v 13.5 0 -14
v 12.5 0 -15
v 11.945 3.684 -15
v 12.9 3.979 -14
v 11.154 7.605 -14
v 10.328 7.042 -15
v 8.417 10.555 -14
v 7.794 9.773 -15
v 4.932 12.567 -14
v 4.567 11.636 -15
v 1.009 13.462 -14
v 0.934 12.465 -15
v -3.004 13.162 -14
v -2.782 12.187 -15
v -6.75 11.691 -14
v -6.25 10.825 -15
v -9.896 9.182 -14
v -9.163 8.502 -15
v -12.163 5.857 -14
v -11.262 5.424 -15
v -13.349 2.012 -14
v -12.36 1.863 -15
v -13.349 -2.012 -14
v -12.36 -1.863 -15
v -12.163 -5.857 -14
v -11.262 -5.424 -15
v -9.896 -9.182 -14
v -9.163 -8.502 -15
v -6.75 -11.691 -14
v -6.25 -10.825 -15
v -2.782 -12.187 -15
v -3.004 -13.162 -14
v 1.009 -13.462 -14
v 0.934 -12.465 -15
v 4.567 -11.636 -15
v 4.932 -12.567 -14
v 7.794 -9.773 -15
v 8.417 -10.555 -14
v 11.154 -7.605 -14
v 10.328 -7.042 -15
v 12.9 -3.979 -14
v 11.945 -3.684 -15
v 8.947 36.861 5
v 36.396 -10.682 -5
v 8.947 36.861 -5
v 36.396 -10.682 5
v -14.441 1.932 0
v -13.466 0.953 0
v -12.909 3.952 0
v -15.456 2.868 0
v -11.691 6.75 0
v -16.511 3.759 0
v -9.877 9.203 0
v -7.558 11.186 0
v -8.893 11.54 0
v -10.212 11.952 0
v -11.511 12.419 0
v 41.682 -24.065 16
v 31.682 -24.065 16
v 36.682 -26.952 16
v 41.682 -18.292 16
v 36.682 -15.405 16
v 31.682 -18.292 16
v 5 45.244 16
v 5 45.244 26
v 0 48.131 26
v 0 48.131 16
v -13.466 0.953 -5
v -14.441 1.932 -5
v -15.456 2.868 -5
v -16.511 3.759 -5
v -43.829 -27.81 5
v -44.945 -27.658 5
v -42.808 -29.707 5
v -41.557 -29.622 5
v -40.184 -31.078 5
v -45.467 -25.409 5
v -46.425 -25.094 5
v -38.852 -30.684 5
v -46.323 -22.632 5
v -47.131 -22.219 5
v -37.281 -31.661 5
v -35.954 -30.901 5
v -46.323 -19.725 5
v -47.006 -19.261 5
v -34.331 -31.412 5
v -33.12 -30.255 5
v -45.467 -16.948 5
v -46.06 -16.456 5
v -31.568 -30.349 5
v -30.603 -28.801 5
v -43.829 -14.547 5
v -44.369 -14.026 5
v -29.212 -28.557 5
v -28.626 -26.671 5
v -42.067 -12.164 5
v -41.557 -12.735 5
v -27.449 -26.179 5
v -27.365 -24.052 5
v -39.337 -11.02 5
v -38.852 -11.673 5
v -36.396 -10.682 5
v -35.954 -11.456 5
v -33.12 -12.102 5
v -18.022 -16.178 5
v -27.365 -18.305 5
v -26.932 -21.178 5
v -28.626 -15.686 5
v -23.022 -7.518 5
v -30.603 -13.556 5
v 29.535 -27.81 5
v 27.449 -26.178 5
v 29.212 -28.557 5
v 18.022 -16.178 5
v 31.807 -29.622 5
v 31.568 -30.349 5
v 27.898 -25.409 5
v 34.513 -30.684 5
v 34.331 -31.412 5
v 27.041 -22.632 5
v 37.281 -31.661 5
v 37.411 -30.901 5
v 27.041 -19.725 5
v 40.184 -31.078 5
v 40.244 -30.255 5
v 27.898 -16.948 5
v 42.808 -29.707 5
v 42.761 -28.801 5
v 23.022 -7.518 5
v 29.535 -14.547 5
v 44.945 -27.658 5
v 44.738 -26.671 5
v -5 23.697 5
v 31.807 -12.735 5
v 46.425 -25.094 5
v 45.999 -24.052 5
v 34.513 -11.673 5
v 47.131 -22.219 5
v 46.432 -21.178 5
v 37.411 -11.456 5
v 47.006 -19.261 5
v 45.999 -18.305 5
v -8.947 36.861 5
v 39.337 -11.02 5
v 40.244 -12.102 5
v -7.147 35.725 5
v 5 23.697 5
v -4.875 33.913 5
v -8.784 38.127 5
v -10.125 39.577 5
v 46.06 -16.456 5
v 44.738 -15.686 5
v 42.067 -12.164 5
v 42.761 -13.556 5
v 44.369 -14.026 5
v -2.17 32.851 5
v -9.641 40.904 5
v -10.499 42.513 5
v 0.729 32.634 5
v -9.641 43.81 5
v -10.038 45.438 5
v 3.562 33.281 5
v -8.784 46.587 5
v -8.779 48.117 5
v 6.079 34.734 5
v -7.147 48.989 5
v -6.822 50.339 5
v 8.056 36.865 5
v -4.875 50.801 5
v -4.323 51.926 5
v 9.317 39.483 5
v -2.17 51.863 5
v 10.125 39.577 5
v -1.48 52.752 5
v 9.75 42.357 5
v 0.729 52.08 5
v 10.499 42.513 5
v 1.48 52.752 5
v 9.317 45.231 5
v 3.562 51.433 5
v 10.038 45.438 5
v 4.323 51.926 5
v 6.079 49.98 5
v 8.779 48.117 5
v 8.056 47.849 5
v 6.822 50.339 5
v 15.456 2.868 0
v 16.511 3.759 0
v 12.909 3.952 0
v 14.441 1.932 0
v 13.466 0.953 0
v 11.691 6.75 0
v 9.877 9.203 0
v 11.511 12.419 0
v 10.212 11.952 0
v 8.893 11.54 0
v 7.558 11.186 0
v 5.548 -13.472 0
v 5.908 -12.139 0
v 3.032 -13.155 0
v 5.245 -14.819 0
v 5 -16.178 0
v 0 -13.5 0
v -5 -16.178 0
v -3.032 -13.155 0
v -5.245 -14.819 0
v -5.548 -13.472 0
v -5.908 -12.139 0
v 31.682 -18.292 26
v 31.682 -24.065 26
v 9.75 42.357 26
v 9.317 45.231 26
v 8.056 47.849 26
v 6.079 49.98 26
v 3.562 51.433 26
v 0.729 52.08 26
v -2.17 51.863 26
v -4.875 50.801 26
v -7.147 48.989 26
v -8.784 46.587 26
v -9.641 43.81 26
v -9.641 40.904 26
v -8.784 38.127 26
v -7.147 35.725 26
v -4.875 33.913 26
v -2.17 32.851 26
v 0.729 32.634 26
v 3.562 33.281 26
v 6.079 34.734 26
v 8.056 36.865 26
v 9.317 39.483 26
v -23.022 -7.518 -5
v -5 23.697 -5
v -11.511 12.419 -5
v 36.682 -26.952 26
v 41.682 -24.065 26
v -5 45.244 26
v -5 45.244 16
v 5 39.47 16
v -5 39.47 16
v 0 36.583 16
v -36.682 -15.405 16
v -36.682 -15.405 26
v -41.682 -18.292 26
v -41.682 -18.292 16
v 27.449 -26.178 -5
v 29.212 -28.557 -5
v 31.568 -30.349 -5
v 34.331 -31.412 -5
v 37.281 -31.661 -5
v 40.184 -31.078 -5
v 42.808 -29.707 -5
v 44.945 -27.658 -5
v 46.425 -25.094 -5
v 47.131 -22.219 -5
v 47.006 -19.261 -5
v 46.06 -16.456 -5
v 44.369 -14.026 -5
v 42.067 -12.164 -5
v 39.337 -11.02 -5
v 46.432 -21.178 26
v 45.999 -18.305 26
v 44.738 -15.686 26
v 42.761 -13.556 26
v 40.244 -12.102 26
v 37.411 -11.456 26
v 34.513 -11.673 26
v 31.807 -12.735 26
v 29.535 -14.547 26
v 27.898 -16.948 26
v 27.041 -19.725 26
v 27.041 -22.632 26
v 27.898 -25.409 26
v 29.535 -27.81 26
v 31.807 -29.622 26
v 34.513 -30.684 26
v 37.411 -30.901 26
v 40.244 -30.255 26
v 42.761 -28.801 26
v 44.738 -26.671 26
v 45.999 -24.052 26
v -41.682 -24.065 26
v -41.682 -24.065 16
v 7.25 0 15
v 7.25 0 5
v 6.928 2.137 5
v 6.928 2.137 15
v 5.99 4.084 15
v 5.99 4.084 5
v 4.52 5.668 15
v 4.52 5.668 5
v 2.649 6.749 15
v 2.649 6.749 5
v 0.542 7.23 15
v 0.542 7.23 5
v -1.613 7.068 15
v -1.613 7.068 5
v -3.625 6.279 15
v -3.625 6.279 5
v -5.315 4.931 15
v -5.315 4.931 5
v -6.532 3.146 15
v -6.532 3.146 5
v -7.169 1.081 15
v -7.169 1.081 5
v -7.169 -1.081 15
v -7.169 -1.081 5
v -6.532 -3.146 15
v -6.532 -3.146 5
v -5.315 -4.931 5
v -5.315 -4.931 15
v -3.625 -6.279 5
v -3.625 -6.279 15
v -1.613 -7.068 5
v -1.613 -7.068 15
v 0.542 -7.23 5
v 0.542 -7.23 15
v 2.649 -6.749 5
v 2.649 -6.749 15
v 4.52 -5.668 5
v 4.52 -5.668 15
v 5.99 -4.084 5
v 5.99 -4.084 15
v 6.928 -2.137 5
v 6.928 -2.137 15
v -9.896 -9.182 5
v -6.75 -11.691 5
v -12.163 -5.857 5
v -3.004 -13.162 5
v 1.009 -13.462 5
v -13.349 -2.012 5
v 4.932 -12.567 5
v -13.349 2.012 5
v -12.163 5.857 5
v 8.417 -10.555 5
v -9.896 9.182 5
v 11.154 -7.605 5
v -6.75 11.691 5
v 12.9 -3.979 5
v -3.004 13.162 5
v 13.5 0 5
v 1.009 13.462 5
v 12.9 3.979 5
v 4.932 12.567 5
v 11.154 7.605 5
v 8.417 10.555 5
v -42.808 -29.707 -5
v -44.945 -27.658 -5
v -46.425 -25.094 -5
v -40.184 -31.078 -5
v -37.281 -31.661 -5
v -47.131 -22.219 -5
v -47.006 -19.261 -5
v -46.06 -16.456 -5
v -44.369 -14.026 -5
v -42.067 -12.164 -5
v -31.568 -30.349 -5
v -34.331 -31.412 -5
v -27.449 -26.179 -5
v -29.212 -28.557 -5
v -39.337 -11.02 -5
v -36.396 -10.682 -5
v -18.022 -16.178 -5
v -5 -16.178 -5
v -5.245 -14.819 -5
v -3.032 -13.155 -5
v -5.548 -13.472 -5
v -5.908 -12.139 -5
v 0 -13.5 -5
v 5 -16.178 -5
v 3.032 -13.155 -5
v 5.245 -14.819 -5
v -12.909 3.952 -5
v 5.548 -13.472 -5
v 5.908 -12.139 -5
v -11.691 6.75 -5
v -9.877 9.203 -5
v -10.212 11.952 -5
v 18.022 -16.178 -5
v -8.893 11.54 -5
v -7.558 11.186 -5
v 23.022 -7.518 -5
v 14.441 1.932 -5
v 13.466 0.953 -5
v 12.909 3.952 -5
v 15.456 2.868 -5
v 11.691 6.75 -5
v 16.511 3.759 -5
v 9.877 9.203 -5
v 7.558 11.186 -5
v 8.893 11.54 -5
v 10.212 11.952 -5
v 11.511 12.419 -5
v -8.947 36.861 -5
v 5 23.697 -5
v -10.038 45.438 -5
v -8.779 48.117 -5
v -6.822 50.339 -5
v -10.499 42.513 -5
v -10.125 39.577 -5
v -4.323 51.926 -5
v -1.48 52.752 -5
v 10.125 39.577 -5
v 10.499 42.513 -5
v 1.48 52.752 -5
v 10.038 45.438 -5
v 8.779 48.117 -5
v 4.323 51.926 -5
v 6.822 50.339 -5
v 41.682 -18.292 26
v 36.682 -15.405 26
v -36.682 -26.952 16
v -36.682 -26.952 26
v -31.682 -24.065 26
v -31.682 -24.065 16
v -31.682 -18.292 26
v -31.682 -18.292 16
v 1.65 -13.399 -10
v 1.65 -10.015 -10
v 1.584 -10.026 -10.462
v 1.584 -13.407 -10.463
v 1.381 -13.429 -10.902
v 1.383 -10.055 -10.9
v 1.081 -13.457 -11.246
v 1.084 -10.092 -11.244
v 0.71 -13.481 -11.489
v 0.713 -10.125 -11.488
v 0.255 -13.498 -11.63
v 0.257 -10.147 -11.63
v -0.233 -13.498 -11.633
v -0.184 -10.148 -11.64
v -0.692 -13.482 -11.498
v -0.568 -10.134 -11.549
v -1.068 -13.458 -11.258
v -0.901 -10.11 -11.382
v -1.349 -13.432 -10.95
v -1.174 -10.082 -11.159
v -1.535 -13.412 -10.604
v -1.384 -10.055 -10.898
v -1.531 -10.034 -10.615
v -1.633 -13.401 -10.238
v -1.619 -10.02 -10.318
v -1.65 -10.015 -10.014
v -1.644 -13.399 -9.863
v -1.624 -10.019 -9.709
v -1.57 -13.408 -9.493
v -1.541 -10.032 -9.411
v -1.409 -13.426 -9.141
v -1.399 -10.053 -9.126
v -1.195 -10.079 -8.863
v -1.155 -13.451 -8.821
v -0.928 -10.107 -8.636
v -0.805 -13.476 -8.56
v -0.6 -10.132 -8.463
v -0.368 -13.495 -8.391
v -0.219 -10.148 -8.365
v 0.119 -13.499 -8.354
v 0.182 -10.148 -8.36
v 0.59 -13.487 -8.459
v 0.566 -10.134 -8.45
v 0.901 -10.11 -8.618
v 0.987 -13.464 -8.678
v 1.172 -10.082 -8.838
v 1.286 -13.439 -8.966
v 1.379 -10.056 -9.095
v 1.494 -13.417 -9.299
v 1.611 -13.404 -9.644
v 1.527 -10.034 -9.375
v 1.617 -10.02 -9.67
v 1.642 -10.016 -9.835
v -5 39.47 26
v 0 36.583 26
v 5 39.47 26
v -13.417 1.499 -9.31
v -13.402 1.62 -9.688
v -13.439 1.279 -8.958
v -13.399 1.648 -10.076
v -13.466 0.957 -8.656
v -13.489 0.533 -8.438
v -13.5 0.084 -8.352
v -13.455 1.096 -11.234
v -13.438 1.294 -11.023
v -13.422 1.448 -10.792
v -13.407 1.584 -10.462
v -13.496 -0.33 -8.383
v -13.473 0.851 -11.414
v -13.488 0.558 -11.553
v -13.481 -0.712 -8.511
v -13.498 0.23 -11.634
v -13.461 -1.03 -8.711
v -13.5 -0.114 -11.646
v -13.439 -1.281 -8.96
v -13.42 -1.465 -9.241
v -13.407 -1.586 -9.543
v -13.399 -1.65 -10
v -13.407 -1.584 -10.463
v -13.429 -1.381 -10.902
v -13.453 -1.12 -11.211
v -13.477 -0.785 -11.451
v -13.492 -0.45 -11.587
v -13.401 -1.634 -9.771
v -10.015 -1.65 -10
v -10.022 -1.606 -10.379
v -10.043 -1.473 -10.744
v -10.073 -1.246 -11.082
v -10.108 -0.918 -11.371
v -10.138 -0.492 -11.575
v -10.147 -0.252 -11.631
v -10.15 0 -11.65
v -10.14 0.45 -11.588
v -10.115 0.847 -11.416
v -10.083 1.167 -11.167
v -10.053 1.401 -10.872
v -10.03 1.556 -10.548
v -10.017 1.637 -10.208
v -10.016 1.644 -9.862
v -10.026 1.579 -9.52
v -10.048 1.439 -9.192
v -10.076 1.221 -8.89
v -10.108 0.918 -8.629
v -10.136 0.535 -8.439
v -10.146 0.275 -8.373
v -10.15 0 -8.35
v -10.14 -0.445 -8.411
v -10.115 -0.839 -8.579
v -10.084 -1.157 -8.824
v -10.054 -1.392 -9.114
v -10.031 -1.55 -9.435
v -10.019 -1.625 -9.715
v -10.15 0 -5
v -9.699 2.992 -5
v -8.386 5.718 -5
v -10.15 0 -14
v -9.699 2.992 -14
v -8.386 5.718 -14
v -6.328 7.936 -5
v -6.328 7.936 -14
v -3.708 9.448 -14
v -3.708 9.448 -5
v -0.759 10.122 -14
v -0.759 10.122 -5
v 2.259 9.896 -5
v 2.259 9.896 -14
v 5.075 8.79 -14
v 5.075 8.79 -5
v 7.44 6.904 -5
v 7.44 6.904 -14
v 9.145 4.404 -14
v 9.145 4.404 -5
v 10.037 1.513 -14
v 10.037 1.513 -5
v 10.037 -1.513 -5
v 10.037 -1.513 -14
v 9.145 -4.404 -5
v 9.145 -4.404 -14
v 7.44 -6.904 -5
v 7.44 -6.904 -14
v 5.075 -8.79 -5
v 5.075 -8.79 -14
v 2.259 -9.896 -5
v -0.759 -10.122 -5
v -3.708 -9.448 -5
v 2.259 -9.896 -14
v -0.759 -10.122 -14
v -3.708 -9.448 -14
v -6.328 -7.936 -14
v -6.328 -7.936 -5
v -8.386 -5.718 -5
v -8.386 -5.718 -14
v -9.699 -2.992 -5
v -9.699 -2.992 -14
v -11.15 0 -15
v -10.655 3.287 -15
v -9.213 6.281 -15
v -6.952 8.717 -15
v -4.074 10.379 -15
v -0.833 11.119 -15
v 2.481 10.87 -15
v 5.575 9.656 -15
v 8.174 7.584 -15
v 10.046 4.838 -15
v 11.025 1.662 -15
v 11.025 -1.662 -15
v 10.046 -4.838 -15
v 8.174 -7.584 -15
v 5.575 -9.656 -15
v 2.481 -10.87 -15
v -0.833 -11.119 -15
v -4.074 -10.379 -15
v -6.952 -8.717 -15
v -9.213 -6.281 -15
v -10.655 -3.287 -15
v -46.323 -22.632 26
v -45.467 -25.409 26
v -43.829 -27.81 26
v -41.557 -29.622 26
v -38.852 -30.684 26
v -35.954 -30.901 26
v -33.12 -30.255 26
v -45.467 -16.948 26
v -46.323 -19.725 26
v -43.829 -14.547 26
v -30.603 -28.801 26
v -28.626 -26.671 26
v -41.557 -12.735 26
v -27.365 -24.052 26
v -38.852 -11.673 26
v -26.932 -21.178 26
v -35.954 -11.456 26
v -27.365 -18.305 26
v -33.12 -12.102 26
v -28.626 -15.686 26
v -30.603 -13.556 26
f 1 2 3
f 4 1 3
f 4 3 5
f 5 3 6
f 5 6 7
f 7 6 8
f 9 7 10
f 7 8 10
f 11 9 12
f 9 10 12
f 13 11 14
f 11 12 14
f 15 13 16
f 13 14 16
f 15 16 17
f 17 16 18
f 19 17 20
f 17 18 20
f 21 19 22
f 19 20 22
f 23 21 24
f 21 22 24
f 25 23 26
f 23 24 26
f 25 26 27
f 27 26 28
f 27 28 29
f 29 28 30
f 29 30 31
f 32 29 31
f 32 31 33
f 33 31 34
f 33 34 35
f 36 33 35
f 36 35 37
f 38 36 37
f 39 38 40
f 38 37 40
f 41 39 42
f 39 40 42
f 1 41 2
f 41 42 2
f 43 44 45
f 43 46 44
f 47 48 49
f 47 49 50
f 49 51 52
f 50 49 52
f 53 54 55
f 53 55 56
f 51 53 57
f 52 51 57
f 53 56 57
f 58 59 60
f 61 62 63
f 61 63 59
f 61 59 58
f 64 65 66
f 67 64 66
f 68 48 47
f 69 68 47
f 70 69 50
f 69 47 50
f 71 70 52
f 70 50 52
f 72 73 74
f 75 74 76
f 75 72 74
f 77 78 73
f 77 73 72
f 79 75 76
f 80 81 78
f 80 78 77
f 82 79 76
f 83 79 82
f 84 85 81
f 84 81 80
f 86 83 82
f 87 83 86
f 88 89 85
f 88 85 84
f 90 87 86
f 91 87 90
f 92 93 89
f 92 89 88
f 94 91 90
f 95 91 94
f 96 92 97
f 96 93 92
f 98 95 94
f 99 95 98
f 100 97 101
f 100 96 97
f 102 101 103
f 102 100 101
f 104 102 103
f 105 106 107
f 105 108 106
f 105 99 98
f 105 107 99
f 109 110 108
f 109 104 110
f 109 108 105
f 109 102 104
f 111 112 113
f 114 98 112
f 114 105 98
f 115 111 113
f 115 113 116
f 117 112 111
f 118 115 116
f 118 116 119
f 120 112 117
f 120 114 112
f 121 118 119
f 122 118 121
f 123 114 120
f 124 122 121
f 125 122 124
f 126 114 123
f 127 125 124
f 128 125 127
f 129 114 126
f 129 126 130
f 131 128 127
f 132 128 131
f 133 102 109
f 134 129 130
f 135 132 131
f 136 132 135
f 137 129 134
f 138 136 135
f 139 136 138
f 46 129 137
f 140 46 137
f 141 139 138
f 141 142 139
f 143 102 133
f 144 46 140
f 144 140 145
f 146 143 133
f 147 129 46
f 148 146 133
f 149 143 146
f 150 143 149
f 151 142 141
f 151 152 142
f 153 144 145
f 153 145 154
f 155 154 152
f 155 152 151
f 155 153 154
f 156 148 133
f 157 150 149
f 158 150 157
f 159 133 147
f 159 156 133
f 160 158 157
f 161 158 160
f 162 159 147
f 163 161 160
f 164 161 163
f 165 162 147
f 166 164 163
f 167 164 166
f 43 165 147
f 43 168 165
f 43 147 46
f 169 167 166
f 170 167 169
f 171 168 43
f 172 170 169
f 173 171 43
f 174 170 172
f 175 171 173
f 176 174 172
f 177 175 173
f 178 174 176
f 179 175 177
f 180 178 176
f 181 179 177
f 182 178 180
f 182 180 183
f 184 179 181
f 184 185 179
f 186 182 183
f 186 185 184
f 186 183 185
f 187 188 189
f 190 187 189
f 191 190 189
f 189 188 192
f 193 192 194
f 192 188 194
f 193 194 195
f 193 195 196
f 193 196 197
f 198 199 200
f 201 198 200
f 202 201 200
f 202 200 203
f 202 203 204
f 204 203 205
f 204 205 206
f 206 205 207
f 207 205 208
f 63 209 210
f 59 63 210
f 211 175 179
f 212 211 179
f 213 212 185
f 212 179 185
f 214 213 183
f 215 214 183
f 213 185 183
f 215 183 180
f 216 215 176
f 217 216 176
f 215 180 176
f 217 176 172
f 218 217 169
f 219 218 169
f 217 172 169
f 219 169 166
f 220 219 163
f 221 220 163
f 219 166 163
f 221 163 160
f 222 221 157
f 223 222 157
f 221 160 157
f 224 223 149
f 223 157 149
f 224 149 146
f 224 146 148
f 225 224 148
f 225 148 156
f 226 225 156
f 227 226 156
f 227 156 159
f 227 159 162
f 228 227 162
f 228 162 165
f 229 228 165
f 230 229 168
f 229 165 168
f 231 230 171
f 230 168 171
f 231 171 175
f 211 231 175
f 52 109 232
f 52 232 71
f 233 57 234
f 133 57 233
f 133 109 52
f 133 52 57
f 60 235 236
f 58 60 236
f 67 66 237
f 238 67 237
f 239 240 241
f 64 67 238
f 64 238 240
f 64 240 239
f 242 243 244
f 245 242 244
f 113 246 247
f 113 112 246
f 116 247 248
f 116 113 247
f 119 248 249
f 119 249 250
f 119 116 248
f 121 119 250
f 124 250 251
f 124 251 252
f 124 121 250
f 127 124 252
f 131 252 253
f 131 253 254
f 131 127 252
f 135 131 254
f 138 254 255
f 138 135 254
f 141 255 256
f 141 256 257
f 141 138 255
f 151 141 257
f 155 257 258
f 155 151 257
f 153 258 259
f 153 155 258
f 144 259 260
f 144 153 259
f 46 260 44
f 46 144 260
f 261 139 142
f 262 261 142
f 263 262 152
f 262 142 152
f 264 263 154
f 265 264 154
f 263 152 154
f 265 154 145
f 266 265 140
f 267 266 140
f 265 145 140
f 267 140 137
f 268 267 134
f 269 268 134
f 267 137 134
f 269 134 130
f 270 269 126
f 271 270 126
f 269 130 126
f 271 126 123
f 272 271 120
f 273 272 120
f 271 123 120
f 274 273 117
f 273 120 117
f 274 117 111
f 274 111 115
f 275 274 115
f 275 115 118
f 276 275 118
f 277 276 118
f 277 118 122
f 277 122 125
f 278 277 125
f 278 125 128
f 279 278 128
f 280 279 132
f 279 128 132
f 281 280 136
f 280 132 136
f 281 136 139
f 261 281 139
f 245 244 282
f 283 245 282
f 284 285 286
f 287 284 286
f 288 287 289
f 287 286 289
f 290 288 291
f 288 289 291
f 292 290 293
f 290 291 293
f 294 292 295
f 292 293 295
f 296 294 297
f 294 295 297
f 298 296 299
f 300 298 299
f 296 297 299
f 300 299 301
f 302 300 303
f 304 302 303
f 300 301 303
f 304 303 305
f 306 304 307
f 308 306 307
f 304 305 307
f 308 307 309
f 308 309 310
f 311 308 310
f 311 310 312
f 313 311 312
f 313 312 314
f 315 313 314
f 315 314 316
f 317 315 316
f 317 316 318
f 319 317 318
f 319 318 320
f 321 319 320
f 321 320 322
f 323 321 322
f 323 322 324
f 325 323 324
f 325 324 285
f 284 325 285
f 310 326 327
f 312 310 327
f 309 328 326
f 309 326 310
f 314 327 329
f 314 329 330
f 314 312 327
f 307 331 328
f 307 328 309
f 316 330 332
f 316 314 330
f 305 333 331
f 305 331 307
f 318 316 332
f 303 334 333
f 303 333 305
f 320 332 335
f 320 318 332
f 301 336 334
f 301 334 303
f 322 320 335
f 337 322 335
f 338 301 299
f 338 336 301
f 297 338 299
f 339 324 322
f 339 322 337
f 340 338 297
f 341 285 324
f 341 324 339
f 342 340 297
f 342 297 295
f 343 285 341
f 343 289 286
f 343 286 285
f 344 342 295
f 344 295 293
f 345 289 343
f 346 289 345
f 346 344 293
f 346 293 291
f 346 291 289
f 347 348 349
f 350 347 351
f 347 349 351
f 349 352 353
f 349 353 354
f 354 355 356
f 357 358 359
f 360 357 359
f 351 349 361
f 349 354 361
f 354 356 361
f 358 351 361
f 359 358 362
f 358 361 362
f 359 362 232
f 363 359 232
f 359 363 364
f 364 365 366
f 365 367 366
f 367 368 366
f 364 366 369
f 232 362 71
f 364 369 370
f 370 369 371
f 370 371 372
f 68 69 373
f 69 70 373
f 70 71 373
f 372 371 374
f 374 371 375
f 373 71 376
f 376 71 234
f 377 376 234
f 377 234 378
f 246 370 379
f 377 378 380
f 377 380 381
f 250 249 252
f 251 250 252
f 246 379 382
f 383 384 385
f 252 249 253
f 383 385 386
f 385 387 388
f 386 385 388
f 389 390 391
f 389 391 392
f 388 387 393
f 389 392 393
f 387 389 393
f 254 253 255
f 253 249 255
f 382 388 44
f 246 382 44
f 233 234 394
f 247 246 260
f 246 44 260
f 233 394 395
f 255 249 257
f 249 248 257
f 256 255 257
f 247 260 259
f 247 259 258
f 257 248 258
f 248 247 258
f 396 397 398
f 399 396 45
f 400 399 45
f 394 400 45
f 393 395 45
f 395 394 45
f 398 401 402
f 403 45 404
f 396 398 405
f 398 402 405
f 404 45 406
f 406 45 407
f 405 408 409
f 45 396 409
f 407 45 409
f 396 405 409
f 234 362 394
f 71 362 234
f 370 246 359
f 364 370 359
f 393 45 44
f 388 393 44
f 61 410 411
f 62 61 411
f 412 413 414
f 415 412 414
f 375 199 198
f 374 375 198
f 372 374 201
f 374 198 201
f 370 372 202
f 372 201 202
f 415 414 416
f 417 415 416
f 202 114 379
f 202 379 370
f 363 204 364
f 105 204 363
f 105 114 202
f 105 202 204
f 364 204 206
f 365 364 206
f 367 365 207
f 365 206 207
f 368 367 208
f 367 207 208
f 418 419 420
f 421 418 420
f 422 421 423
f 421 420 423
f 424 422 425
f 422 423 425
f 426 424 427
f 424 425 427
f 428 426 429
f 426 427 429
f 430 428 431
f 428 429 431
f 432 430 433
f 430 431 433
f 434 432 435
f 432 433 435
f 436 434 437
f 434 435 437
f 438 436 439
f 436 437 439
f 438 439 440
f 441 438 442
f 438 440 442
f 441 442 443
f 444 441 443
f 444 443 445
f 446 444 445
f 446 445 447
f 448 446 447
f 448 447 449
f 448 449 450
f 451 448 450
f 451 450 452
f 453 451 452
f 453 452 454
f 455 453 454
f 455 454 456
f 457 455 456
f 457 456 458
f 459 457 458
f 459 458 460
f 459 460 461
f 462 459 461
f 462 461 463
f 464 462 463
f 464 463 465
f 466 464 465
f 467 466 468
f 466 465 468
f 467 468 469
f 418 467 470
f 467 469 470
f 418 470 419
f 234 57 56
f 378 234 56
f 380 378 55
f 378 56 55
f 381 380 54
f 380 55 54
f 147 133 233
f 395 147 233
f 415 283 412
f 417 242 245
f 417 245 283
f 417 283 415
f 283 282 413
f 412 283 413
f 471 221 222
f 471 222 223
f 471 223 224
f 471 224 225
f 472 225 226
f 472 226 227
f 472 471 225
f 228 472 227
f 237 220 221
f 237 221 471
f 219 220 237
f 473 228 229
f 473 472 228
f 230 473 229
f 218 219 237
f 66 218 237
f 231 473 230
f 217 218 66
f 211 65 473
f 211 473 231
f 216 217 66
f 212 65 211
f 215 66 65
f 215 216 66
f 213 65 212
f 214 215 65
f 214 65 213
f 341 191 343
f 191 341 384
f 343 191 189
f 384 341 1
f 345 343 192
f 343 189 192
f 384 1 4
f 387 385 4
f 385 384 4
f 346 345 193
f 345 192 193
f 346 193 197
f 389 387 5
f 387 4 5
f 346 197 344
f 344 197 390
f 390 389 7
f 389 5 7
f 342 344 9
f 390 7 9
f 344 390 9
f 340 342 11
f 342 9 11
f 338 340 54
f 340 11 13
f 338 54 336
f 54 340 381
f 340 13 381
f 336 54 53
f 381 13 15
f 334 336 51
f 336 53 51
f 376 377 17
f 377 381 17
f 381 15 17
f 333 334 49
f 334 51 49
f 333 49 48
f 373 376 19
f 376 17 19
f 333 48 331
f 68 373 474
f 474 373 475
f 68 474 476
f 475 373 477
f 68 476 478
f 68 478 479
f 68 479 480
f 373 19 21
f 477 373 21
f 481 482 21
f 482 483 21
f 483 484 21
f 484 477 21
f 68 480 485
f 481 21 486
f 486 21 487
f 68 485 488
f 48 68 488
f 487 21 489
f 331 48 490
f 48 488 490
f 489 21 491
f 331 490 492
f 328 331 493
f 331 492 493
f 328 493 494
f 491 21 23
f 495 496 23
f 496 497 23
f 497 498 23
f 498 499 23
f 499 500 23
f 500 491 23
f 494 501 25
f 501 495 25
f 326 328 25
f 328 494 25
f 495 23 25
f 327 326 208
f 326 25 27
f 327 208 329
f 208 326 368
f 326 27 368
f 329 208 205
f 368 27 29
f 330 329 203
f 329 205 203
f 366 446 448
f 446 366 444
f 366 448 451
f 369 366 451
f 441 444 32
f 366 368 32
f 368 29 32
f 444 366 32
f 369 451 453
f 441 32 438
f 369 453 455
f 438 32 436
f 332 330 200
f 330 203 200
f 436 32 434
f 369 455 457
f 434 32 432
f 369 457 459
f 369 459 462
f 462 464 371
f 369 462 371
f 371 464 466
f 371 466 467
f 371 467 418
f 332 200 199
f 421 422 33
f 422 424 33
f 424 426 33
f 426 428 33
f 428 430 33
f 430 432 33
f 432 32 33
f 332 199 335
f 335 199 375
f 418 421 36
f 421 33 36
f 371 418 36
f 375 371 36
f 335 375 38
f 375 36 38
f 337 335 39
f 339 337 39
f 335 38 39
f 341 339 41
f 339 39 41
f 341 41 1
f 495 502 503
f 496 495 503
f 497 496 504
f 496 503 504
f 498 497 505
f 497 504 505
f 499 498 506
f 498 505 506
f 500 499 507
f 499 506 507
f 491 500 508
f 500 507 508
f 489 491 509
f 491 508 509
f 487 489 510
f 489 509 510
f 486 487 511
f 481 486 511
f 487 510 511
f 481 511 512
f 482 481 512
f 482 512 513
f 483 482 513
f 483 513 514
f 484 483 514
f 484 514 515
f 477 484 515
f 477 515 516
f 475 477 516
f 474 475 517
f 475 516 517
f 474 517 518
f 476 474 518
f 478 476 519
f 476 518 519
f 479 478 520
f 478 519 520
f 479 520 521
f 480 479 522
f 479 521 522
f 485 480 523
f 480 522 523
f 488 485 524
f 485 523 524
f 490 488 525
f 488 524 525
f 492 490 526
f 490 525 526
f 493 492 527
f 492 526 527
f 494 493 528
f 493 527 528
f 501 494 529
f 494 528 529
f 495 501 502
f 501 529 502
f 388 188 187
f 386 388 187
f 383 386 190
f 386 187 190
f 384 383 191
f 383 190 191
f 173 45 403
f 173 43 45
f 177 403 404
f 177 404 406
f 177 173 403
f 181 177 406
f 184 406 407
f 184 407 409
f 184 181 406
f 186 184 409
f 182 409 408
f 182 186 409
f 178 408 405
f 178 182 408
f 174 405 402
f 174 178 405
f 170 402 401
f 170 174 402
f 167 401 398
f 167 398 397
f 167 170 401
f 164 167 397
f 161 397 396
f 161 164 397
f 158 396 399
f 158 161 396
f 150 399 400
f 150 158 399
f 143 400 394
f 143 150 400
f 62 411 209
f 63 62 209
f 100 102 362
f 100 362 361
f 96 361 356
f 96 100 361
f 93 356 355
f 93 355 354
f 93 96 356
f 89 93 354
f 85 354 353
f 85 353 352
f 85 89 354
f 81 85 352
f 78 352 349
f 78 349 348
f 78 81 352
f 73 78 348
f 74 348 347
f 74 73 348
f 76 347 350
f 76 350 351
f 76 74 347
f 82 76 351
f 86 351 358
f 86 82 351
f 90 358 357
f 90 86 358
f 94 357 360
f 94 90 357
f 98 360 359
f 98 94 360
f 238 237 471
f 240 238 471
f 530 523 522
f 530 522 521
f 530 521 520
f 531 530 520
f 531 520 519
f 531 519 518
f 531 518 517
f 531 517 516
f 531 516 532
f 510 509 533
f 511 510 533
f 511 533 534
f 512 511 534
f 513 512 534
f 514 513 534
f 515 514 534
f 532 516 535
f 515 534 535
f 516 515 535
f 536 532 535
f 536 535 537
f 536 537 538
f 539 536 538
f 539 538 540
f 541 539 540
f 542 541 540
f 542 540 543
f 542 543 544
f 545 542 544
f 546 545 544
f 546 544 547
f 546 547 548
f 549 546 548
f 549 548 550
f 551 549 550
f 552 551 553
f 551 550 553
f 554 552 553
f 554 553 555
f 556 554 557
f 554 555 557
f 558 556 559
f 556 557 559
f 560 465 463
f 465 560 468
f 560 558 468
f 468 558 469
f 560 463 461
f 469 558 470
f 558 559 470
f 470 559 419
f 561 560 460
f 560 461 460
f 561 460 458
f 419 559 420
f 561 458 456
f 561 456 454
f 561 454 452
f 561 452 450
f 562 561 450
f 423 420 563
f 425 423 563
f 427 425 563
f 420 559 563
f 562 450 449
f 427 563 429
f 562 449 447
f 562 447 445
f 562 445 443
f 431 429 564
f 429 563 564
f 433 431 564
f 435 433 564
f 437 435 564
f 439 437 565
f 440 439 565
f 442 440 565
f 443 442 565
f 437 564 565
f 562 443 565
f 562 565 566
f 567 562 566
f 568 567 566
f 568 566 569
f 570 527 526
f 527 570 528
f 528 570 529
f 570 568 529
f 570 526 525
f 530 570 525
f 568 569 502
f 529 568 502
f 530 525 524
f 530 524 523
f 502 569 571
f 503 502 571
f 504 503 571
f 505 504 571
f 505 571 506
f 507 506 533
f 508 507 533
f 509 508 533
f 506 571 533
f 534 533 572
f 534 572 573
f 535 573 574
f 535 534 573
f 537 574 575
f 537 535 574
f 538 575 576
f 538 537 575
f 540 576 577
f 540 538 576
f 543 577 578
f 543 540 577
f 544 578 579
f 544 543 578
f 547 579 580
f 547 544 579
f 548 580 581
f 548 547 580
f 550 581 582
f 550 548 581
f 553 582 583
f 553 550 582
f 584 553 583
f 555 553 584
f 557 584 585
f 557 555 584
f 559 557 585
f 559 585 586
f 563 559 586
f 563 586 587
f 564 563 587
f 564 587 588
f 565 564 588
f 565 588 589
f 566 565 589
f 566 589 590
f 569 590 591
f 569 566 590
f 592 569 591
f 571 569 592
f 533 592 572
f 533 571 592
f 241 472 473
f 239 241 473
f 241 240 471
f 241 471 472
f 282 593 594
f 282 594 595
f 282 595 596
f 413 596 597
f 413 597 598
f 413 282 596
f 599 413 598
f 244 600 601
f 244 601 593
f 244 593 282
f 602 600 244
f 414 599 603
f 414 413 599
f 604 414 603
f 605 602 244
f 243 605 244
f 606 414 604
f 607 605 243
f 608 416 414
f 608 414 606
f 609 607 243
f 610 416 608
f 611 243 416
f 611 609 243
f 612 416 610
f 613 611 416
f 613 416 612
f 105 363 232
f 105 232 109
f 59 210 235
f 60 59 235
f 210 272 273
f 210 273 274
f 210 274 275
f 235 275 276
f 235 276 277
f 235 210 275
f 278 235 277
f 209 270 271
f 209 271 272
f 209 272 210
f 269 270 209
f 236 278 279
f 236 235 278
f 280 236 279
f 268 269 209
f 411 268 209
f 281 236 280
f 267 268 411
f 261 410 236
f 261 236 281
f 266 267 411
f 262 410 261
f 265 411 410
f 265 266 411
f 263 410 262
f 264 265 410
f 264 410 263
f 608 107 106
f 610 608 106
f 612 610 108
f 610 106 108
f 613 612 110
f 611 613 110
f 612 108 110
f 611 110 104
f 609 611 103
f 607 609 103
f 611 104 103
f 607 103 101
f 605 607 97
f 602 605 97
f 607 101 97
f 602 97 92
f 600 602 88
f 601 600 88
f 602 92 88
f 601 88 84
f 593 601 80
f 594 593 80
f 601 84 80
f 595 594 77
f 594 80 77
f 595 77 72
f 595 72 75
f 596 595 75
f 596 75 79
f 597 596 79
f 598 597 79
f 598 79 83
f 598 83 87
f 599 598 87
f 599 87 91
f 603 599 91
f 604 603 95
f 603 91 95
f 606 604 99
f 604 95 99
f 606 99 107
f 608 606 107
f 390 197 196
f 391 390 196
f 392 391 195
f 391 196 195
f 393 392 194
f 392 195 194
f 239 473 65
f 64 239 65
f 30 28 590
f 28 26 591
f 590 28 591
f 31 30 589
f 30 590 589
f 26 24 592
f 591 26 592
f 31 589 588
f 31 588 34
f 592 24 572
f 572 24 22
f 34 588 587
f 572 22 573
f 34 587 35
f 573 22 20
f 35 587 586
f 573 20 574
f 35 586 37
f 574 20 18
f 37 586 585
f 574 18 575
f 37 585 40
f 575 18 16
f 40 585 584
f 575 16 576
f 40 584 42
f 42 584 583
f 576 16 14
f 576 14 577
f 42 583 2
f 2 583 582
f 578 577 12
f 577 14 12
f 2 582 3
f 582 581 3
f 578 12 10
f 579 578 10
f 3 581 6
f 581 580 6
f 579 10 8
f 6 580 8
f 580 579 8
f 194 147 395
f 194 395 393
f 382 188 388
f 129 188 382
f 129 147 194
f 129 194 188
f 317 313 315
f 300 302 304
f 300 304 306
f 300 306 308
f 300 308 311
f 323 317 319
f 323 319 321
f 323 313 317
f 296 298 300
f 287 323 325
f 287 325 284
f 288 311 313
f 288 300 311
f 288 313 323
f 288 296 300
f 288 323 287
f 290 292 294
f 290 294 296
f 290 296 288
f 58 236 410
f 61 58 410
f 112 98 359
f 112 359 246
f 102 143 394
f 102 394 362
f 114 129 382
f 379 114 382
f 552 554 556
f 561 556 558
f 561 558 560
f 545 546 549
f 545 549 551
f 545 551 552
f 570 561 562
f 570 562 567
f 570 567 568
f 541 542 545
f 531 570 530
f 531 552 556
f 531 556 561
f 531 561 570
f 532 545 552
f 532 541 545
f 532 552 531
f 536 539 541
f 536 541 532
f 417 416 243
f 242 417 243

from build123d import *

# Parameters (mm, degrees)
BOSS_EXTRUDE1_DEPTH = 5
BOSS_EXTRUDE2_DEPTH = 5
SKETCH4_R           = 9.75
BOSS_EXTRUDE3_DEPTH = 21
BOSS_EXTRUDE4_START = -15
SKETCH5_R           = 13.5
BOSS_EXTRUDE4_DEPTH = 20
SKETCH5_3_R         = 7.25
BOSS_EXTRUDE5_DEPTH = 15
CHAMFER1_SIZE       = 10
CUT_EXTRUDE1_DEPTH  = 10
SKETCH9_R           = 10.15
CUT_EXTRUDE2_DEPTH  = 10
CHAMFER2_SIZE       = 1
SKETCH10_R          = 1.65
CUT_EXTRUDE3_DEPTH  = 32.6785
CIRPATTERN1_COUNT   = 2
CIRPATTERN1_ANGLE   = 90


with BuildPart() as part:
    # Sketch2 → Boss-Extrude1 (new body, symmetric)
    with BuildSketch(Plane.XY):
        with BuildLine():
            ThreePointArc((8.946673347, 36.860907204), (0, 52.857), (-8.946673347, 36.860907204))
            Line((-8.946673347, 36.860907204), (-36.395818719, -10.682407204))
            ThreePointArc((-36.395818719, -10.682407204), (-45.775504768, -26.4285), (-27.449145372, -26.1785))
            Line((-27.449145372, -26.1785), (27.449145372, -26.1785))
            ThreePointArc((27.449145372, -26.1785), (45.775504768, -26.4285), (36.395818719, -10.682407204))
            Line((36.395818719, -10.682407204), (8.946673347, 36.860907204))
        make_face()
        Polygon((-28.02198399, -16.1785), (0, 32.357), (28.02198399, -16.1785), align=None, mode=Mode.SUBTRACT)
    extrude(amount=BOSS_EXTRUDE1_DEPTH, both=True)

    # Sketch3 → Boss-Extrude2 (add)
    with BuildSketch(Plane.XY):
        with BuildLine():
            Line((-16.510991995, 3.759122981), (-11.510991995, 12.419377019))
            ThreePointArc((-11.510991995, 12.419377019), (0, 10.282645658), (11.510991995, 12.419377019))
            Line((11.510991995, 12.419377019), (16.510991995, 3.759122981))
            ThreePointArc((16.510991995, 3.759122981), (8.905032358, -5.141322829), (5, -16.1785))
            Line((5, -16.1785), (-5, -16.1785))
            ThreePointArc((-5, -16.1785), (-8.905032358, -5.141322829), (-16.510991995, 3.759122981))
        make_face()
    extrude(amount=-BOSS_EXTRUDE2_DEPTH)

    # Sketch4 → Boss-Extrude3 (add)
    with BuildSketch(Plane.XY.offset(5)):
        with Locations((-36.682238028, -21.1785)):
            Circle(SKETCH4_R)
        with Locations((36.682238028, -21.1785)):
            Circle(SKETCH4_R)
        with Locations((0, 42.357)):
            Circle(SKETCH4_R)
    extrude(amount=BOSS_EXTRUDE3_DEPTH)

    # Sketch5 → Boss-Extrude4 (add)
    with BuildSketch(Plane.XY.offset(BOSS_EXTRUDE4_START)):
        Circle(SKETCH5_R)
    extrude(amount=BOSS_EXTRUDE4_DEPTH)

    # Sketch5_3 → Boss-Extrude5 (add)
    with BuildSketch(Plane.XY):
        Circle(SKETCH5_3_R)
    extrude(amount=BOSS_EXTRUDE5_DEPTH)

    # Chamfer1
    chamfer1_edges = [part.edges().sort_by_distance(p)[0] for p in [
        (28.02198399, -16.1785, 0),
        (-28.02198399, -16.1785, 0),
        (0, 32.357, 0),
    ]]
    chamfer(chamfer1_edges, length=CHAMFER1_SIZE)

    # Sketch8 → Cut-Extrude1 (cut)
    with BuildSketch(Plane.XY.offset(26)):
        Polygon((-41.682238028, -24.065251346), (-36.682238028, -26.952002692), (-31.682238028, -24.065251346), (-31.682238028, -18.291748654), (-36.682238028, -15.404997308), (-41.682238028, -18.291748654), align=None)
        Polygon((41.682238028, -24.065251346), (41.682238028, -18.291748654), (36.682238028, -15.404997308), (31.682238028, -18.291748654), (31.682238028, -24.065251346), (36.682238028, -26.952002692), align=None)
        Polygon((0, 48.130502692), (-5, 45.243751346), (-5, 39.470248654), (0, 36.583497308), (5, 39.470248654), (5, 45.243751346), align=None)
    extrude(amount=-CUT_EXTRUDE1_DEPTH, mode=Mode.SUBTRACT)

    # Sketch9 → Cut-Extrude2 (cut)
    with BuildSketch(Plane(origin=(0, 0, -15), x_dir=(-1, 0, 0), z_dir=(0, 0, -1))):
        Circle(SKETCH9_R)
    extrude(amount=-CUT_EXTRUDE2_DEPTH, mode=Mode.SUBTRACT)

    # Chamfer2
    chamfer2_edges = [part.edges().sort_by_distance(p)[0] for p in [
        (10.15, 0, -15),
        (-13.5, 0, -15),
    ]]
    chamfer(chamfer2_edges, length=CHAMFER2_SIZE)

    # Sketch10 → Cut-Extrude3 (cut, through all)
    with BuildSketch(Plane(origin=(0, 0, 0), x_dir=(1, 0, 0), z_dir=(0, 1, 0))):
        with Locations((0, 10)):
            Circle(SKETCH10_R)
    cut_extrude3 = extrude(amount=-CUT_EXTRUDE3_DEPTH, mode=Mode.SUBTRACT)

    # CirPattern1: Cut-Extrude3 ×2 about axis
    cirpattern1_axis = Axis((0, 0, 43.183766184), (0, 0, -1))
    for i in range(1, CIRPATTERN1_COUNT):
        add(cut_extrude3.rotate(cirpattern1_axis, i * CIRPATTERN1_ANGLE / (CIRPATTERN1_COUNT - 1)), mode=Mode.SUBTRACT)


solid = part.part
